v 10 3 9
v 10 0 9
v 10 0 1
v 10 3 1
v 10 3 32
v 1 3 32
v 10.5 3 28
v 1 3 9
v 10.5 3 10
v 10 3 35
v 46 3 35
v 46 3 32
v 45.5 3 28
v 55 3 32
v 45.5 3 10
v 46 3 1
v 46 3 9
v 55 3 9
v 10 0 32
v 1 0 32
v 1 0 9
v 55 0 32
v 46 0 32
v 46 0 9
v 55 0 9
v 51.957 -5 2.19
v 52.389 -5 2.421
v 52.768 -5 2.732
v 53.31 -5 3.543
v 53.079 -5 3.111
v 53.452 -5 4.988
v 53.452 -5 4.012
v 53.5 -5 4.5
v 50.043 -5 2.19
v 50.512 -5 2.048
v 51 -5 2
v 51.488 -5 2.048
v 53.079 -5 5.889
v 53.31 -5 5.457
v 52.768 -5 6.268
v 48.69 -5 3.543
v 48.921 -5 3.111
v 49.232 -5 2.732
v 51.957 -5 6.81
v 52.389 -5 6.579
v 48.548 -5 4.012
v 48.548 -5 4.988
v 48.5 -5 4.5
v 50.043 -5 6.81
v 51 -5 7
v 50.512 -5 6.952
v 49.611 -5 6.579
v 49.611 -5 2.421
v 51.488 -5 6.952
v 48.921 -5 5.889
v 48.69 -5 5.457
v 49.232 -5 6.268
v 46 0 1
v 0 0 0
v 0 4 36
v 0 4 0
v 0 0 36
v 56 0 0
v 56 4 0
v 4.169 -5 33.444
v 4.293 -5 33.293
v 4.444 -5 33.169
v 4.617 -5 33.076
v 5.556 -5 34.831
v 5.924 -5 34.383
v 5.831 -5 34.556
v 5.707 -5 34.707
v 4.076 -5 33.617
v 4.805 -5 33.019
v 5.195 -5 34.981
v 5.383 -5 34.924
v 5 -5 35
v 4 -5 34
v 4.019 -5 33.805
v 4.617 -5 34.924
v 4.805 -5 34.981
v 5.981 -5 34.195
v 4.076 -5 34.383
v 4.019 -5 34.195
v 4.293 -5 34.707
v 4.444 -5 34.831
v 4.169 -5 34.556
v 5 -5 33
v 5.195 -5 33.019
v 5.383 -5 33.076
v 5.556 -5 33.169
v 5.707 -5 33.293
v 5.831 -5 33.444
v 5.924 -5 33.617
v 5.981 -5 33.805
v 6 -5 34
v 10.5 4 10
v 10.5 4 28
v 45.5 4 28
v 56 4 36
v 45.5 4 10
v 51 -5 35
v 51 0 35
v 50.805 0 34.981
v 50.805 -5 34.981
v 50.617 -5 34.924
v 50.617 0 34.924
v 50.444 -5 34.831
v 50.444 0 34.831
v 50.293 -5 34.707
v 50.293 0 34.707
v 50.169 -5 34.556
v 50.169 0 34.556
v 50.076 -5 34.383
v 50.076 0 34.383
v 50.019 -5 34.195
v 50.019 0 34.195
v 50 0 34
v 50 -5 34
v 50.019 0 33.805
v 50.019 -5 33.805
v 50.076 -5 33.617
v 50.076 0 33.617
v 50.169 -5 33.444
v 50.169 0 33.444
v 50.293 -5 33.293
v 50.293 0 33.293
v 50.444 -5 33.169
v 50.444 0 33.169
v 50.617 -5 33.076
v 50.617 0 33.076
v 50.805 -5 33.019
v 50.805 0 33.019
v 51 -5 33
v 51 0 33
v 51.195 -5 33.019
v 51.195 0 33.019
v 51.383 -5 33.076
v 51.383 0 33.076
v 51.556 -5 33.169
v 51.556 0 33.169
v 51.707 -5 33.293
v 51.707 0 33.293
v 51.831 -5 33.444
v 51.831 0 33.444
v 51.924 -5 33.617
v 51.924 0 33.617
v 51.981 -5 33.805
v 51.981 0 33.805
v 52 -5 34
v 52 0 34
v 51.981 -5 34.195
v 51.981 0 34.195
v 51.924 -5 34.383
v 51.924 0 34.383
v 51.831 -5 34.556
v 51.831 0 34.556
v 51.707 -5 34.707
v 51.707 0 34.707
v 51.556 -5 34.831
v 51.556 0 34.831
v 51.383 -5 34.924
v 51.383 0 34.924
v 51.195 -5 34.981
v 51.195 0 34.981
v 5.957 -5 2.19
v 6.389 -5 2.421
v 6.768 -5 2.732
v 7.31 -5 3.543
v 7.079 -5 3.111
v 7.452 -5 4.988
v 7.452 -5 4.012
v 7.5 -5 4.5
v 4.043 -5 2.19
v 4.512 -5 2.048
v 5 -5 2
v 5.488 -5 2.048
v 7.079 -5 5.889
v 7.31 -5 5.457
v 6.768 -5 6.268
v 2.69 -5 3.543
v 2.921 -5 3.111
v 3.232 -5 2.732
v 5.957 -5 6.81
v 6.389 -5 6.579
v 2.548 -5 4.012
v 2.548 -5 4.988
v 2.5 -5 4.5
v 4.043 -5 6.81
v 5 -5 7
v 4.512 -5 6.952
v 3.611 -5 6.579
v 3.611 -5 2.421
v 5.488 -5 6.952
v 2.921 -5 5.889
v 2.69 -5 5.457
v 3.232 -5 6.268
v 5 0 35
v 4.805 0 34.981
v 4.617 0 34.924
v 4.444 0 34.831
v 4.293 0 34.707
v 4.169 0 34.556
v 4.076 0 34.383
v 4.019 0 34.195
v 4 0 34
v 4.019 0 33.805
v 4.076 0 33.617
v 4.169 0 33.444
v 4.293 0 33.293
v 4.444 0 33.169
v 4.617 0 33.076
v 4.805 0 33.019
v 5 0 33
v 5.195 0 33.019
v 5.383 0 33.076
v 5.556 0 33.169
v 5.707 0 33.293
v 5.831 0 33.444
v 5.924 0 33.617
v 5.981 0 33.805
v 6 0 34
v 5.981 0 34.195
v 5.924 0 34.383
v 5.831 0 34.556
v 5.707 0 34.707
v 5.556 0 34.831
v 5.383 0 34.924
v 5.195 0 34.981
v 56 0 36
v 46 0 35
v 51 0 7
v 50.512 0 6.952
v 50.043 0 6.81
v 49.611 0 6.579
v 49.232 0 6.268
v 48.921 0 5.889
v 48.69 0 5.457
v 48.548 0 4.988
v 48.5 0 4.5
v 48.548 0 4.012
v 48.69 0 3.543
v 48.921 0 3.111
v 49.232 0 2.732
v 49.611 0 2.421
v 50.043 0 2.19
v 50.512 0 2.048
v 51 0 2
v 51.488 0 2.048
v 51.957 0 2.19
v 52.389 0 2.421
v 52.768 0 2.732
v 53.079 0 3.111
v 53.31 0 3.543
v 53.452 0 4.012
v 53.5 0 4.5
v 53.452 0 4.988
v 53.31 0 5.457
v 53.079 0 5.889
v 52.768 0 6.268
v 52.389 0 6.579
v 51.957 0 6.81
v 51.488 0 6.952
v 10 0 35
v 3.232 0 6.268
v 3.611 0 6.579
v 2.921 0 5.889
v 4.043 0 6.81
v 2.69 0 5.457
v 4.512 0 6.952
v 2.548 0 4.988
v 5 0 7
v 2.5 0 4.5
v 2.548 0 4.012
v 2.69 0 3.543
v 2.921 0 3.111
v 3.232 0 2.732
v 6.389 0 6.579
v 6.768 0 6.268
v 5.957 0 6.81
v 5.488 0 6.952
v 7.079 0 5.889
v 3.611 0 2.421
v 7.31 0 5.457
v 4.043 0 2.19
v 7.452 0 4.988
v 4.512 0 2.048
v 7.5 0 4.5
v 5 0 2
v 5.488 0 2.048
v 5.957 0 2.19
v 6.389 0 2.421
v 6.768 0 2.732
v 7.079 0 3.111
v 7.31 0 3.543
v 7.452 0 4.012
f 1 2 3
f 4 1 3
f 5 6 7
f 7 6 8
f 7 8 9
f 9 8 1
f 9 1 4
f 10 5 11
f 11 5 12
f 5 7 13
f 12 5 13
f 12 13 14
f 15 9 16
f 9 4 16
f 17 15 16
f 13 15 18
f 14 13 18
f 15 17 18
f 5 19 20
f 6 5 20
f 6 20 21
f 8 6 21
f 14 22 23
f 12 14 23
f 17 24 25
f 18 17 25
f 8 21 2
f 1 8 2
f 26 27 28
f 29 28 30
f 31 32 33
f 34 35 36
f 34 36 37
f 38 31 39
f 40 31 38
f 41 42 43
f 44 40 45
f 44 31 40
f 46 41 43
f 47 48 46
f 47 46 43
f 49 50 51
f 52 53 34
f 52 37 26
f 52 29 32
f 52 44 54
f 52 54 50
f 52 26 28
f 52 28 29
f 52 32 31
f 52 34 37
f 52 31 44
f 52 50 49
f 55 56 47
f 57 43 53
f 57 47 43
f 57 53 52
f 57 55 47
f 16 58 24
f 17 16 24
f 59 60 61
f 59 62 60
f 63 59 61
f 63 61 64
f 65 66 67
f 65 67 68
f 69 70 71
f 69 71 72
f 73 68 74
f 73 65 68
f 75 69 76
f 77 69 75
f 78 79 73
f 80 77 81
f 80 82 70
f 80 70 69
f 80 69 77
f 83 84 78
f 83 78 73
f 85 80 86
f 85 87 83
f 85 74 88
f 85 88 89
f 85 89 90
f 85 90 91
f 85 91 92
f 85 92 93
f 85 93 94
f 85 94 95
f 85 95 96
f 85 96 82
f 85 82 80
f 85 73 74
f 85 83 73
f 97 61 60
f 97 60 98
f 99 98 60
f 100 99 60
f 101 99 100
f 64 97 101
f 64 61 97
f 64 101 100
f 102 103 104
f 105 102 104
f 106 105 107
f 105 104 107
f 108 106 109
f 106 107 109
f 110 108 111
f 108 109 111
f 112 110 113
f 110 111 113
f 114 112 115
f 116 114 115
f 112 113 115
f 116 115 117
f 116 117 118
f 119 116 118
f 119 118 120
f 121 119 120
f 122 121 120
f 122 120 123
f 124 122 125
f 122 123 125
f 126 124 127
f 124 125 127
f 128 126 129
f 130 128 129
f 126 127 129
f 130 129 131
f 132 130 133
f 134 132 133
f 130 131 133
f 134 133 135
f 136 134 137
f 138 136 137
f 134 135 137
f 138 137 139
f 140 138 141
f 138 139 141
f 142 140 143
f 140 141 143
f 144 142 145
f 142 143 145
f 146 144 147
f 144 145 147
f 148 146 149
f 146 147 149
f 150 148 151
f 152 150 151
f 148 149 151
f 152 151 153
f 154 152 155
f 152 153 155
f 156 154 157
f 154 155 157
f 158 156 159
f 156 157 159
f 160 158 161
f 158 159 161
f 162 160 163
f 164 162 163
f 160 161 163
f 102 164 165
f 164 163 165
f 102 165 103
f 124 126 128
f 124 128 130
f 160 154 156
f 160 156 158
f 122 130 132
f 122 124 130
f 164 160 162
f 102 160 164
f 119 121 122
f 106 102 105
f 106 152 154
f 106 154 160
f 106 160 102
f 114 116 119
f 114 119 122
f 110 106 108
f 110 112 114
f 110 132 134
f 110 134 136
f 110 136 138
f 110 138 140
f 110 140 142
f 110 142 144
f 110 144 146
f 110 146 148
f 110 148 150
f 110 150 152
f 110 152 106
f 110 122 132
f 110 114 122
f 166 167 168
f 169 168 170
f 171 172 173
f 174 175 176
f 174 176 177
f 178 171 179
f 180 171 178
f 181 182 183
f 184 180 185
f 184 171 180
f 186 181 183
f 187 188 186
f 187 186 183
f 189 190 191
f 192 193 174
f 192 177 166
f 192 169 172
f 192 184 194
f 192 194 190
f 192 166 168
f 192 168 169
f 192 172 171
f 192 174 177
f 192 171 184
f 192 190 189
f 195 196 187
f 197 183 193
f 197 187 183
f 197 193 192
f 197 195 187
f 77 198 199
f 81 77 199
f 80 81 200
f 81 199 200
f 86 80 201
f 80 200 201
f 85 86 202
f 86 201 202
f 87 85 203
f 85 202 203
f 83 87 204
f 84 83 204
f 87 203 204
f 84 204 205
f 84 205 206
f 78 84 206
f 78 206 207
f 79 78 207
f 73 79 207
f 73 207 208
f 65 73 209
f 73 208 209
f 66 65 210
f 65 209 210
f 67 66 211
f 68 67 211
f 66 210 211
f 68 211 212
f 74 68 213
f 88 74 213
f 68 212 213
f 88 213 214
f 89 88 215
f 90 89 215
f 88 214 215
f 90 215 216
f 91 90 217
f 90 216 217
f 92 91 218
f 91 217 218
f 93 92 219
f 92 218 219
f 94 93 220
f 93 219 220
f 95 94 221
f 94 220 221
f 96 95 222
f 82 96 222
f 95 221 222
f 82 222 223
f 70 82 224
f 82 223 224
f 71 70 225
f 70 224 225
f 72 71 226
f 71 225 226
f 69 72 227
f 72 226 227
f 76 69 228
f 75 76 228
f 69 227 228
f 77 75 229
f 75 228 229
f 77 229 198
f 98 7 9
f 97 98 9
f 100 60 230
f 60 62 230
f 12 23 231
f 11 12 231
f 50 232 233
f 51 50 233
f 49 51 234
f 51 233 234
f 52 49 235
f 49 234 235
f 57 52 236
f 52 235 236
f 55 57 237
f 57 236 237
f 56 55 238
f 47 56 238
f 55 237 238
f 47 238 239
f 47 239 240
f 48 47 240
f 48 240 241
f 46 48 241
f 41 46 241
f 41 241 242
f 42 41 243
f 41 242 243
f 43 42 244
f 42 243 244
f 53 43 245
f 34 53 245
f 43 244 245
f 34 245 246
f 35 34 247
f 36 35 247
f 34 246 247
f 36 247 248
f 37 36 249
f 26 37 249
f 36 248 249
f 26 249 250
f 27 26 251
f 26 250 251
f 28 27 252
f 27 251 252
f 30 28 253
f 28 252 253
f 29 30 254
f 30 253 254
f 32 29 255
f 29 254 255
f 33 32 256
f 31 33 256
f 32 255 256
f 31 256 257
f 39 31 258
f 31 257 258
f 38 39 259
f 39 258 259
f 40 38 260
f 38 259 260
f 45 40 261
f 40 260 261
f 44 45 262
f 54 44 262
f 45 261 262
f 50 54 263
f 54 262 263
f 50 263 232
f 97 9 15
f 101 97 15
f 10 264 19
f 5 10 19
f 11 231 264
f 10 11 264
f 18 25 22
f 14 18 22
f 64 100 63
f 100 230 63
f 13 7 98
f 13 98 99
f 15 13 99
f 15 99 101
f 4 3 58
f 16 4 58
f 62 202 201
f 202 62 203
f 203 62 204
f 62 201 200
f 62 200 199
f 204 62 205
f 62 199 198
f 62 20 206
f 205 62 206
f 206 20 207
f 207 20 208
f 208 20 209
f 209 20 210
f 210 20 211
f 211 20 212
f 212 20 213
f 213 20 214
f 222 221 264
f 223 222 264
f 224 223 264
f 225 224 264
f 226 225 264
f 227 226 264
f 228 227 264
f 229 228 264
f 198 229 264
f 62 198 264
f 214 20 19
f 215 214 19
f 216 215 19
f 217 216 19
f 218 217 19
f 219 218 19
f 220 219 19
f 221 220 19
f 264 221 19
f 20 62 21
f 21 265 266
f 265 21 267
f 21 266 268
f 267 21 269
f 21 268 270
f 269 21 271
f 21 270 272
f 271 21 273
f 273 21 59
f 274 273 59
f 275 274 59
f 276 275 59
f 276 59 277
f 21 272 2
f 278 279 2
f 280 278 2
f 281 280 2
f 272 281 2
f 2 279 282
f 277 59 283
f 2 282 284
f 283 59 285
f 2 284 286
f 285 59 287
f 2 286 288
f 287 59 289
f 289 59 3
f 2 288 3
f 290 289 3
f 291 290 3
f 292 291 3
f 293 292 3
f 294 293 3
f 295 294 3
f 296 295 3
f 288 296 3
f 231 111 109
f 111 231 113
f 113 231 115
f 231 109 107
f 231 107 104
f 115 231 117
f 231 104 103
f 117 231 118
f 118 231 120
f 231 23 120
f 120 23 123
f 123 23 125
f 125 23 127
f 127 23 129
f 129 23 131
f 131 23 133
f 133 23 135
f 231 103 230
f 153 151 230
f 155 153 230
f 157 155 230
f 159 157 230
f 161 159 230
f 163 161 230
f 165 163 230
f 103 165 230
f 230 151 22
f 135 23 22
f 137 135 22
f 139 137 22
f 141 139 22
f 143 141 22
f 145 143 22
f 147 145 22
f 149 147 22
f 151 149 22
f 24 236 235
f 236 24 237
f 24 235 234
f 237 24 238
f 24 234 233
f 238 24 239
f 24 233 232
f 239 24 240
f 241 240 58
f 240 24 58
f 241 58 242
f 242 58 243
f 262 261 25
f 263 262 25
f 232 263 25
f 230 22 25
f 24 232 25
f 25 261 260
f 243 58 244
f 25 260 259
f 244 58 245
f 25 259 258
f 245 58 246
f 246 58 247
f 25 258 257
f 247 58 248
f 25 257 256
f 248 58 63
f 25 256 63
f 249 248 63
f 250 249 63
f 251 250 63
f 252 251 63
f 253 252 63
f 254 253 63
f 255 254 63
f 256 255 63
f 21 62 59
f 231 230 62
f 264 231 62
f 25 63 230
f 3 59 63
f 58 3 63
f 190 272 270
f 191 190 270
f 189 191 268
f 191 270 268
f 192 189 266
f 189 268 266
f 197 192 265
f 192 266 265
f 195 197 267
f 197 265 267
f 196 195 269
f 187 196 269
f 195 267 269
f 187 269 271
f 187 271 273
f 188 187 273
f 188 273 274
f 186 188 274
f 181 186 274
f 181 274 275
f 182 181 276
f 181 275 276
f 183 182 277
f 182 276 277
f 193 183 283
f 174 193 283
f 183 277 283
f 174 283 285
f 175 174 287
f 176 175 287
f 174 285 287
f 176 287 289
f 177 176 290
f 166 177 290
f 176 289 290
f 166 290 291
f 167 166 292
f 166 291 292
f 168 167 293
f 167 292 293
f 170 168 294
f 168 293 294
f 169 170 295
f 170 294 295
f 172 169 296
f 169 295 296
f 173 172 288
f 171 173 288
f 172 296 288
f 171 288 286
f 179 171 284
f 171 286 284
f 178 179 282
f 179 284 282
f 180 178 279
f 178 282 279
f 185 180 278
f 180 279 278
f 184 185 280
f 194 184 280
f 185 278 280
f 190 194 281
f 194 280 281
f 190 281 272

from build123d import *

# Parameters (mm, degrees)
SKETCH_1_W      = 56
SKETCH_1_H      = 36
EXTRUDE_3_DEPTH = 3
SKETCH_2_W      = 56
SKETCH_2_H      = 36
SKETCH_2_W_2    = 35
SKETCH_2_H_2    = 18
EXTRUDE_4_DEPTH = 1
SKETCH_3_R      = 1
SKETCH_3_R_2    = 2.5
EXTRUDE_5_DEPTH = 5


with BuildPart() as part:
    # 草图1 → 凸台-拉伸3 (new body)
    with BuildSketch(Plane(origin=(0, 0, 0), x_dir=(1, 0, 0), z_dir=(0, 1, 0))):
        with Locations((28, -18)):
            Rectangle(SKETCH_1_W, SKETCH_1_H)
        Polygon((10, -32), (1, -32), (1, -9), (10, -9), (10, -1), (46, -1), (46, -9), (55, -9), (55, -32), (46, -32), (46, -35), (10, -35), align=None, mode=Mode.SUBTRACT)
    extrude(amount=EXTRUDE_3_DEPTH)

    # 草图2 → 凸台-拉伸4 (add)
    with BuildSketch(Plane(origin=(0, 3, 0), x_dir=(1, 0, 0), z_dir=(0, 1, 0))):
        with Locations((28, -18)):
            Rectangle(SKETCH_2_W, SKETCH_2_H)
        with Locations((28, -19)):
            Rectangle(SKETCH_2_W_2, SKETCH_2_H_2, mode=Mode.SUBTRACT)
    extrude(amount=EXTRUDE_4_DEPTH)

    # 草图3 → 凸台-拉伸5 (add)
    with BuildSketch(Plane(origin=(0, 0, 0), x_dir=(-1, 0, 0), z_dir=(0, -1, 0))):
        with Locations(Location((-51, -34, 0), (0, 0, 270))):
            Circle(SKETCH_3_R)
        with Locations(Location((-5, -34, 0), (0, 0, 270))):
            Circle(SKETCH_3_R)
        with Locations(Location((-51, -4.5, 0), (0, 0, 270))):
            Circle(SKETCH_3_R_2)
        with Locations(Location((-5, -4.5, 0), (0, 0, 270))):
            Circle(SKETCH_3_R_2)
    extrude(amount=EXTRUDE_5_DEPTH)


solid = part.part
